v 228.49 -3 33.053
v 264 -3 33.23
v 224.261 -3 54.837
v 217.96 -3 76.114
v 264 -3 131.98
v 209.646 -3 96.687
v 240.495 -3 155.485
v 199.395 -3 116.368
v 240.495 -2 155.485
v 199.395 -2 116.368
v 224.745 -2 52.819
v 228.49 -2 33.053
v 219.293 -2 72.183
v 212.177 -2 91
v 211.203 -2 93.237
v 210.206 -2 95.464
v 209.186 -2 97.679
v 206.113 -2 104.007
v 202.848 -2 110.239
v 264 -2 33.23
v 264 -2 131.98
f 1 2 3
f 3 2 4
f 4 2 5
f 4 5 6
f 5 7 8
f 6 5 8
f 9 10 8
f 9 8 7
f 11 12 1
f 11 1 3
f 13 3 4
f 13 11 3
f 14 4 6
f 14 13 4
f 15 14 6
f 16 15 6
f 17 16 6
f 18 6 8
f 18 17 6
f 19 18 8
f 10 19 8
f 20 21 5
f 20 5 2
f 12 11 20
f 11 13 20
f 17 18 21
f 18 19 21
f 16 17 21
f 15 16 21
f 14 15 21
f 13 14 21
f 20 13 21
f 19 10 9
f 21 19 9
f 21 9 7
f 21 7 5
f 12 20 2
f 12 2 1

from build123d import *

# Parameters (mm, degrees)
BASEPLATE_PROFILE_DEPTH               = 2
SKETCH2_R                             = 1
M3_PINS_DEPTH                         = 5
M3_PINS_TAPER                         = 7
CIRPATTERN1_COUNT                     = 32
SKETCH4_R                             = 1
PILLAR_PINS_DEPTH                     = 5
PILLAR_PINS_DRAFT                     = 6
PILLAR_PINS_PROFILE_2_DEPTH           = 5
PILLAR_PINS_PROFILE_2_DRAFT           = 6
CIRPATTERN2_COPY_1_SKETCH_R           = 1
CIRPATTERN2_COPY_1_DEPTH              = 5
CIRPATTERN2_COPY_1_DRAFT              = 6
CIRPATTERN2_COPY_2_SKETCH_R           = 1
CIRPATTERN2_COPY_2_DEPTH              = 5
CIRPATTERN2_COPY_2_DRAFT              = 6
CIRPATTERN2_COPY_3_SKETCH_R           = 1
CIRPATTERN2_COPY_3_DEPTH              = 5
CIRPATTERN2_COPY_3_DRAFT              = 6
CIRPATTERN2_COPY_4_SKETCH_R           = 1
CIRPATTERN2_COPY_4_DEPTH              = 5
CIRPATTERN2_COPY_4_DRAFT              = 6
CIRPATTERN2_COPY_5_SKETCH_R           = 1
CIRPATTERN2_COPY_5_DEPTH              = 5
CIRPATTERN2_COPY_5_DRAFT              = 6
CIRPATTERN2_COPY_6_SKETCH_R           = 1
CIRPATTERN2_COPY_6_DEPTH              = 5
CIRPATTERN2_COPY_6_DRAFT              = 6
CIRPATTERN2_COPY_7_SKETCH_R           = 1
CIRPATTERN2_COPY_7_DEPTH              = 5
CIRPATTERN2_COPY_7_DRAFT              = 6
CIRPATTERN2_COPY_8_SKETCH_R           = 1
CIRPATTERN2_COPY_8_DEPTH              = 5
CIRPATTERN2_COPY_8_DRAFT              = 6
CIRPATTERN2_COPY_9_SKETCH_R           = 1
CIRPATTERN2_COPY_9_DEPTH              = 5
CIRPATTERN2_COPY_9_DRAFT              = 6
CIRPATTERN2_COPY_10_SKETCH_R          = 1
CIRPATTERN2_COPY_10_DEPTH             = 5
CIRPATTERN2_COPY_10_DRAFT             = 6
CIRPATTERN2_COPY_11_SKETCH_R          = 1
CIRPATTERN2_COPY_11_DEPTH             = 5
CIRPATTERN2_COPY_11_DRAFT             = 6
CIRPATTERN2_COPY_12_SKETCH_R          = 1
CIRPATTERN2_COPY_12_DEPTH             = 5
CIRPATTERN2_COPY_12_DRAFT             = 6
CIRPATTERN2_COPY_13_SKETCH_R          = 1
CIRPATTERN2_COPY_13_DEPTH             = 5
CIRPATTERN2_COPY_13_DRAFT             = 6
CIRPATTERN2_COPY_14_SKETCH_R          = 1
CIRPATTERN2_COPY_14_DEPTH             = 5
CIRPATTERN2_COPY_14_DRAFT             = 6
CIRPATTERN2_COPY_15_SKETCH_R          = 1
CIRPATTERN2_COPY_15_DEPTH             = 5
CIRPATTERN2_COPY_15_DRAFT             = 6
SKETCH5_R                             = 3
M8_HOLE_1_DEPTH                       = 5
M8_HOLE_1_TAPER                       = 12
M8_1_PATTERN_COUNT                    = 4
SKETCH6_R                             = 3
EXTRUDE_M8_2_DEPTH                    = 5
EXTRUDE_M8_2_TAPER                    = 12
M8_2_PATTERN_COUNT                    = 4
PATTERN_CIRCULAR_M8_3_COUNT           = 2
PATTERN_CIRCULAR_M8_3_ANGLE           = 36.9
PATTERN_CIRCULAR_M8_3_COPY_1_SKETCH_R = 3
PATTERN_CIRCULAR_M8_3_COPY_1_DEPTH    = 5
PATTERN_CIRCULAR_M8_3_COPY_1_TAPER    = 12
PATTERN_CIRCULAR_M8_3_COPY_2_SKETCH_R = 3
PATTERN_CIRCULAR_M8_3_COPY_2_DEPTH    = 5
PATTERN_CIRCULAR_M8_3_COPY_2_TAPER    = 12
PATTERN_CIRCULAR_M8_3_COPY_3_SKETCH_R = 3
PATTERN_CIRCULAR_M8_3_COPY_3_DEPTH    = 5
PATTERN_CIRCULAR_M8_3_COPY_3_TAPER    = 12
CUT_CENTER_DEPTH                      = 374.385859402
CIRPATTERN7_COUNT                     = 6
SKETCH16_W                            = 706.015434107
SKETCH16_H                            = 962.246603821
SKETCH16_W_2                          = 199
SKETCH16_H_2                          = 199
CUT_EXTRUDE4_DEPTH                    = 374.417996354
CUT_EXTRUDE5_DEPTH                    = 374.385859402
BOSS_EXTRUDE3_DEPTH                   = 2
BOSS_EXTRUDE4_DEPTH                   = 1
SKETCH21_W                            = 326.425161963
SKETCH21_H                            = 364.538398874
CUT_EXTRUDE6_DEPTH                    = 374.417996354


with BuildPart() as part:
    # Sketch1 → baseplate profile (new body)
    with BuildSketch(Plane(origin=(0, 0, 0), x_dir=(1, 0, 0), z_dir=(0, 1, 0))):
        Polygon((264, 0), (264, 131.98), (131.979594929, 264), (0, 264), (-131.98, 264), (-264, 131.979594929), (-264, 0), (-264, -131.98), (-131.979594929, -264), (0, -264), (131.98, -264), (264, -131.979594929), align=None)
    extrude(amount=-BASEPLATE_PROFILE_DEPTH)

    # Sketch2 → M3 pins (add)
    with BuildSketch(Plane(origin=(0, 0, 0), x_dir=(1, 0, 0), z_dir=(0, 1, 0))):
        with Locations((0, 248)):
            Circle(SKETCH2_R)
    m3_pins = extrude(amount=M3_PINS_DEPTH, taper=M3_PINS_TAPER)

    # CirPattern1: M3 pins ×32 about axis
    cirpattern1_axis = Axis((0, 0, 0), (0, 1, 0))
    for i in range(1, CIRPATTERN1_COUNT):
        add(m3_pins.rotate(cirpattern1_axis, i * 360 / CIRPATTERN1_COUNT))


with BuildPart() as pillar_pins_tool:
    # Sketch4 → pillar pins (with draft: the straight prism first)
    with BuildSketch(Plane(origin=(0, 0, 0), x_dir=(1, 0, 0), z_dir=(0, 1, 0))):
        with Locations((9, 201)):
            Circle(SKETCH4_R)
    extrude(amount=PILLAR_PINS_DEPTH)
    # pillar pins: the draft: its side faces are tilted about the plane it starts from
    pillar_pins_sides = [pillar_pins_tool.faces().sort_by_distance(p)[0] for p in [
        (8, 2.5, -201),
    ]]
    draft(pillar_pins_sides, Plane(origin=(0, 0, 0), x_dir=(1, 0, 0), z_dir=(0, 1, 0)), PILLAR_PINS_DRAFT)


with BuildPart() as part_1:
    add(part.part)

    # pillar pins: add pillar_pins_tool
    add(pillar_pins_tool.part)


with BuildPart() as pillar_pins_profile_2_tool:
    # Sketch4 → pillar pins profile 2 (with draft: the straight prism first)
    with BuildSketch(Plane(origin=(0, 0, 0), x_dir=(1, 0, 0), z_dir=(0, 1, 0))):
        with Locations((-9, 201)):
            Circle(SKETCH4_R)
    extrude(amount=PILLAR_PINS_PROFILE_2_DEPTH)
    # pillar pins profile 2: the draft: its side faces are tilted about the plane it starts from
    pillar_pins_profile_2_sides = [pillar_pins_profile_2_tool.faces().sort_by_distance(p)[0] for p in [
        (-10, 2.5, -201),
    ]]
    draft(pillar_pins_profile_2_sides, Plane(origin=(0, 0, 0), x_dir=(1, 0, 0), z_dir=(0, 1, 0)), PILLAR_PINS_PROFILE_2_DRAFT)


with BuildPart() as part_2:
    add(part_1.part)

    # pillar pins profile 2: add pillar_pins_profile_2_tool
    add(pillar_pins_profile_2_tool.part)


with BuildPart() as cirpattern2_copy_1_tool:
    # CirPattern2 copy 1 sketch → CirPattern2 copy 1 (with draft: the straight prism first)
    with BuildSketch(Plane(origin=(0, 0, 0), x_dir=(0.5000000000000001, 0, -0.8660254037844386), z_dir=(0, 1, 0))):
        with Locations((9, 201)):
            Circle(CIRPATTERN2_COPY_1_SKETCH_R)
    extrude(amount=CIRPATTERN2_COPY_1_DEPTH)
    # CirPattern2 copy 1: the draft: its side faces are tilted about the plane it starts from
    cirpattern2_copy_1_sides = [cirpattern2_copy_1_tool.faces().sort_by_distance(p)[0] for p in [
        (-170.071106161, 2.5, -107.42820323),
    ]]
    draft(cirpattern2_copy_1_sides, Plane(origin=(0, 0, 0), x_dir=(0.5000000000000001, 0, -0.8660254037844386), z_dir=(0, 1, 0)), CIRPATTERN2_COPY_1_DRAFT)


with BuildPart() as part_3:
    add(part_2.part)

    # CirPattern2 copy 1: add cirpattern2_copy_1_tool
    add(cirpattern2_copy_1_tool.part)


with BuildPart() as cirpattern2_copy_2_tool:
    # CirPattern2 copy 2 sketch → CirPattern2 copy 2 (with draft: the straight prism first)
    with BuildSketch(Plane(origin=(0, 0, 0), x_dir=(-0.4999999999999998, 0, -0.8660254037844387), z_dir=(0, 1, 0))):
        with Locations((9, 201)):
            Circle(CIRPATTERN2_COPY_2_SKETCH_R)
    extrude(amount=CIRPATTERN2_COPY_2_DEPTH)
    # CirPattern2 copy 2: the draft: its side faces are tilted about the plane it starts from
    cirpattern2_copy_2_sides = [cirpattern2_copy_2_tool.faces().sort_by_distance(p)[0] for p in [
        (-178.071106161, 2.5, 93.57179677),
    ]]
    draft(cirpattern2_copy_2_sides, Plane(origin=(0, 0, 0), x_dir=(-0.4999999999999998, 0, -0.8660254037844387), z_dir=(0, 1, 0)), CIRPATTERN2_COPY_2_DRAFT)


with BuildPart() as part_4:
    add(part_3.part)

    # CirPattern2 copy 2: add cirpattern2_copy_2_tool
    add(cirpattern2_copy_2_tool.part)


with BuildPart() as cirpattern2_copy_3_tool:
    # CirPattern2 copy 3 sketch → CirPattern2 copy 3 (with draft: the straight prism first)
    with BuildSketch(Plane(origin=(0, 0, 0), x_dir=(-1, 0, 0), z_dir=(0, 1, 0))):
        with Locations((9, 201)):
            Circle(CIRPATTERN2_COPY_3_SKETCH_R)
    extrude(amount=CIRPATTERN2_COPY_3_DEPTH)
    # CirPattern2 copy 3: the draft: its side faces are tilted about the plane it starts from
    cirpattern2_copy_3_sides = [cirpattern2_copy_3_tool.faces().sort_by_distance(p)[0] for p in [
        (-8, 2.5, 201),
    ]]
    draft(cirpattern2_copy_3_sides, Plane(origin=(0, 0, 0), x_dir=(-1, 0, 0), z_dir=(0, 1, 0)), CIRPATTERN2_COPY_3_DRAFT)


with BuildPart() as part_5:
    add(part_4.part)

    # CirPattern2 copy 3: add cirpattern2_copy_3_tool
    add(cirpattern2_copy_3_tool.part)


with BuildPart() as cirpattern2_copy_4_tool:
    # CirPattern2 copy 4 sketch → CirPattern2 copy 4 (with draft: the straight prism first)
    with BuildSketch(Plane(origin=(0, 0, 0), x_dir=(-0.5000000000000004, 0, 0.8660254037844384), z_dir=(0, 1, 0))):
        with Locations((9, 201)):
            Circle(CIRPATTERN2_COPY_4_SKETCH_R)
    extrude(amount=CIRPATTERN2_COPY_4_DEPTH)
    # CirPattern2 copy 4: the draft: its side faces are tilted about the plane it starts from
    cirpattern2_copy_4_sides = [cirpattern2_copy_4_tool.faces().sort_by_distance(p)[0] for p in [
        (170.071106161, 2.5, 107.42820323),
    ]]
    draft(cirpattern2_copy_4_sides, Plane(origin=(0, 0, 0), x_dir=(-0.5000000000000004, 0, 0.8660254037844384), z_dir=(0, 1, 0)), CIRPATTERN2_COPY_4_DRAFT)


with BuildPart() as part_6:
    add(part_5.part)

    # CirPattern2 copy 4: add cirpattern2_copy_4_tool
    add(cirpattern2_copy_4_tool.part)


with BuildPart() as cirpattern2_copy_5_tool:
    # CirPattern2 copy 5 sketch → CirPattern2 copy 5 (with draft: the straight prism first)
    with BuildSketch(Plane(origin=(0, 0, 0), x_dir=(0.5000000000000001, 0, 0.8660254037844386), z_dir=(0, 1, 0))):
        with Locations((9, 201)):
            Circle(CIRPATTERN2_COPY_5_SKETCH_R)
    extrude(amount=CIRPATTERN2_COPY_5_DEPTH)
    # CirPattern2 copy 5: the draft: its side faces are tilted about the plane it starts from
    cirpattern2_copy_5_sides = [cirpattern2_copy_5_tool.faces().sort_by_distance(p)[0] for p in [
        (178.071106161, 2.5, -93.57179677),
    ]]
    draft(cirpattern2_copy_5_sides, Plane(origin=(0, 0, 0), x_dir=(0.5000000000000001, 0, 0.8660254037844386), z_dir=(0, 1, 0)), CIRPATTERN2_COPY_5_DRAFT)


with BuildPart() as part_7:
    add(part_6.part)

    # CirPattern2 copy 5: add cirpattern2_copy_5_tool
    add(cirpattern2_copy_5_tool.part)


with BuildPart() as cirpattern2_copy_6_tool:
    # CirPattern2 copy 6 sketch → CirPattern2 copy 6 (with draft: the straight prism first)
    with BuildSketch(Plane(origin=(0, 0, 0), x_dir=(0.5000000000000001, 0, -0.8660254037844386), z_dir=(0, 1, 0))):
        with Locations((-9, 201)):
            Circle(CIRPATTERN2_COPY_6_SKETCH_R)
    extrude(amount=CIRPATTERN2_COPY_6_DEPTH)
    # CirPattern2 copy 6: the draft: its side faces are tilted about the plane it starts from
    cirpattern2_copy_6_sides = [cirpattern2_copy_6_tool.faces().sort_by_distance(p)[0] for p in [
        (-179.071106161, 2.5, -91.839745962),
    ]]
    draft(cirpattern2_copy_6_sides, Plane(origin=(0, 0, 0), x_dir=(0.5000000000000001, 0, -0.8660254037844386), z_dir=(0, 1, 0)), CIRPATTERN2_COPY_6_DRAFT)


with BuildPart() as part_8:
    add(part_7.part)

    # CirPattern2 copy 6: add cirpattern2_copy_6_tool
    add(cirpattern2_copy_6_tool.part)


with BuildPart() as cirpattern2_copy_7_tool:
    # CirPattern2 copy 7 sketch → CirPattern2 copy 7 (with draft: the straight prism first)
    with BuildSketch(Plane(origin=(0, 0, 0), x_dir=(-0.4999999999999998, 0, -0.8660254037844387), z_dir=(0, 1, 0))):
        with Locations((-9, 201)):
            Circle(CIRPATTERN2_COPY_7_SKETCH_R)
    extrude(amount=CIRPATTERN2_COPY_7_DEPTH)
    # CirPattern2 copy 7: the draft: its side faces are tilted about the plane it starts from
    cirpattern2_copy_7_sides = [cirpattern2_copy_7_tool.faces().sort_by_distance(p)[0] for p in [
        (-169.071106161, 2.5, 109.160254038),
    ]]
    draft(cirpattern2_copy_7_sides, Plane(origin=(0, 0, 0), x_dir=(-0.4999999999999998, 0, -0.8660254037844387), z_dir=(0, 1, 0)), CIRPATTERN2_COPY_7_DRAFT)


with BuildPart() as part_9:
    add(part_8.part)

    # CirPattern2 copy 7: add cirpattern2_copy_7_tool
    add(cirpattern2_copy_7_tool.part)


with BuildPart() as cirpattern2_copy_8_tool:
    # CirPattern2 copy 8 sketch → CirPattern2 copy 8 (with draft: the straight prism first)
    with BuildSketch(Plane(origin=(0, 0, 0), x_dir=(-1, 0, 0), z_dir=(0, 1, 0))):
        with Locations((-9, 201)):
            Circle(CIRPATTERN2_COPY_8_SKETCH_R)
    extrude(amount=CIRPATTERN2_COPY_8_DEPTH)
    # CirPattern2 copy 8: the draft: its side faces are tilted about the plane it starts from
    cirpattern2_copy_8_sides = [cirpattern2_copy_8_tool.faces().sort_by_distance(p)[0] for p in [
        (10, 2.5, 201),
    ]]
    draft(cirpattern2_copy_8_sides, Plane(origin=(0, 0, 0), x_dir=(-1, 0, 0), z_dir=(0, 1, 0)), CIRPATTERN2_COPY_8_DRAFT)


with BuildPart() as part_10:
    add(part_9.part)

    # CirPattern2 copy 8: add cirpattern2_copy_8_tool
    add(cirpattern2_copy_8_tool.part)


with BuildPart() as cirpattern2_copy_9_tool:
    # CirPattern2 copy 9 sketch → CirPattern2 copy 9 (with draft: the straight prism first)
    with BuildSketch(Plane(origin=(0, 0, 0), x_dir=(-0.5000000000000004, 0, 0.8660254037844384), z_dir=(0, 1, 0))):
        with Locations((-9, 201)):
            Circle(CIRPATTERN2_COPY_9_SKETCH_R)
    extrude(amount=CIRPATTERN2_COPY_9_DEPTH)
    # CirPattern2 copy 9: the draft: its side faces are tilted about the plane it starts from
    cirpattern2_copy_9_sides = [cirpattern2_copy_9_tool.faces().sort_by_distance(p)[0] for p in [
        (179.071106161, 2.5, 91.839745962),
    ]]
    draft(cirpattern2_copy_9_sides, Plane(origin=(0, 0, 0), x_dir=(-0.5000000000000004, 0, 0.8660254037844384), z_dir=(0, 1, 0)), CIRPATTERN2_COPY_9_DRAFT)


with BuildPart() as part_11:
    add(part_10.part)

    # CirPattern2 copy 9: add cirpattern2_copy_9_tool
    add(cirpattern2_copy_9_tool.part)


with BuildPart() as cirpattern2_copy_10_tool:
    # CirPattern2 copy 10 sketch → CirPattern2 copy 10 (with draft: the straight prism first)
    with BuildSketch(Plane(origin=(0, 0, 0), x_dir=(0.5000000000000001, 0, 0.8660254037844386), z_dir=(0, 1, 0))):
        with Locations((-9, 201)):
            Circle(CIRPATTERN2_COPY_10_SKETCH_R)
    extrude(amount=CIRPATTERN2_COPY_10_DEPTH)
    # CirPattern2 copy 10: the draft: its side faces are tilted about the plane it starts from
    cirpattern2_copy_10_sides = [cirpattern2_copy_10_tool.faces().sort_by_distance(p)[0] for p in [
        (169.071106161, 2.5, -109.160254038),
    ]]
    draft(cirpattern2_copy_10_sides, Plane(origin=(0, 0, 0), x_dir=(0.5000000000000001, 0, 0.8660254037844386), z_dir=(0, 1, 0)), CIRPATTERN2_COPY_10_DRAFT)


with BuildPart() as part_12:
    add(part_11.part)

    # CirPattern2 copy 10: add cirpattern2_copy_10_tool
    add(cirpattern2_copy_10_tool.part)


with BuildPart() as cirpattern2_copy_11_tool:
    # CirPattern2 copy 11 sketch → CirPattern2 copy 11 (with draft: the straight prism first)
    with BuildSketch(Plane(origin=(0, 0, 0), x_dir=(0.5000000000000001, 0, -0.8660254037844386), z_dir=(0, 1, 0))):
        with Locations((-9, 201)):
            Circle(CIRPATTERN2_COPY_11_SKETCH_R)
    extrude(amount=CIRPATTERN2_COPY_11_DEPTH)
    # CirPattern2 copy 11: the draft: its side faces are tilted about the plane it starts from
    cirpattern2_copy_11_sides = [cirpattern2_copy_11_tool.faces().sort_by_distance(p)[0] for p in [
        (-179.071106161, 2.5, -91.839745962),
    ]]
    draft(cirpattern2_copy_11_sides, Plane(origin=(0, 0, 0), x_dir=(0.5000000000000001, 0, -0.8660254037844386), z_dir=(0, 1, 0)), CIRPATTERN2_COPY_11_DRAFT)


with BuildPart() as part_13:
    add(part_12.part)

    # CirPattern2 copy 11: add cirpattern2_copy_11_tool
    add(cirpattern2_copy_11_tool.part)


with BuildPart() as cirpattern2_copy_12_tool:
    # CirPattern2 copy 12 sketch → CirPattern2 copy 12 (with draft: the straight prism first)
    with BuildSketch(Plane(origin=(0, 0, 0), x_dir=(-0.4999999999999998, 0, -0.8660254037844387), z_dir=(0, 1, 0))):
        with Locations((-9, 201)):
            Circle(CIRPATTERN2_COPY_12_SKETCH_R)
    extrude(amount=CIRPATTERN2_COPY_12_DEPTH)
    # CirPattern2 copy 12: the draft: its side faces are tilted about the plane it starts from
    cirpattern2_copy_12_sides = [cirpattern2_copy_12_tool.faces().sort_by_distance(p)[0] for p in [
        (-169.071106161, 2.5, 109.160254038),
    ]]
    draft(cirpattern2_copy_12_sides, Plane(origin=(0, 0, 0), x_dir=(-0.4999999999999998, 0, -0.8660254037844387), z_dir=(0, 1, 0)), CIRPATTERN2_COPY_12_DRAFT)


with BuildPart() as part_14:
    add(part_13.part)

    # CirPattern2 copy 12: add cirpattern2_copy_12_tool
    add(cirpattern2_copy_12_tool.part)


with BuildPart() as cirpattern2_copy_13_tool:
    # CirPattern2 copy 13 sketch → CirPattern2 copy 13 (with draft: the straight prism first)
    with BuildSketch(Plane(origin=(0, 0, 0), x_dir=(-1, 0, 0), z_dir=(0, 1, 0))):
        with Locations((-9, 201)):
            Circle(CIRPATTERN2_COPY_13_SKETCH_R)
    extrude(amount=CIRPATTERN2_COPY_13_DEPTH)
    # CirPattern2 copy 13: the draft: its side faces are tilted about the plane it starts from
    cirpattern2_copy_13_sides = [cirpattern2_copy_13_tool.faces().sort_by_distance(p)[0] for p in [
        (10, 2.5, 201),
    ]]
    draft(cirpattern2_copy_13_sides, Plane(origin=(0, 0, 0), x_dir=(-1, 0, 0), z_dir=(0, 1, 0)), CIRPATTERN2_COPY_13_DRAFT)


with BuildPart() as part_15:
    add(part_14.part)

    # CirPattern2 copy 13: add cirpattern2_copy_13_tool
    add(cirpattern2_copy_13_tool.part)


with BuildPart() as cirpattern2_copy_14_tool:
    # CirPattern2 copy 14 sketch → CirPattern2 copy 14 (with draft: the straight prism first)
    with BuildSketch(Plane(origin=(0, 0, 0), x_dir=(-0.5000000000000004, 0, 0.8660254037844384), z_dir=(0, 1, 0))):
        with Locations((-9, 201)):
            Circle(CIRPATTERN2_COPY_14_SKETCH_R)
    extrude(amount=CIRPATTERN2_COPY_14_DEPTH)
    # CirPattern2 copy 14: the draft: its side faces are tilted about the plane it starts from
    cirpattern2_copy_14_sides = [cirpattern2_copy_14_tool.faces().sort_by_distance(p)[0] for p in [
        (179.071106161, 2.5, 91.839745962),
    ]]
    draft(cirpattern2_copy_14_sides, Plane(origin=(0, 0, 0), x_dir=(-0.5000000000000004, 0, 0.8660254037844384), z_dir=(0, 1, 0)), CIRPATTERN2_COPY_14_DRAFT)


with BuildPart() as part_16:
    add(part_15.part)

    # CirPattern2 copy 14: add cirpattern2_copy_14_tool
    add(cirpattern2_copy_14_tool.part)


with BuildPart() as cirpattern2_copy_15_tool:
    # CirPattern2 copy 15 sketch → CirPattern2 copy 15 (with draft: the straight prism first)
    with BuildSketch(Plane(origin=(0, 0, 0), x_dir=(0.5000000000000001, 0, 0.8660254037844386), z_dir=(0, 1, 0))):
        with Locations((-9, 201)):
            Circle(CIRPATTERN2_COPY_15_SKETCH_R)
    extrude(amount=CIRPATTERN2_COPY_15_DEPTH)
    # CirPattern2 copy 15: the draft: its side faces are tilted about the plane it starts from
    cirpattern2_copy_15_sides = [cirpattern2_copy_15_tool.faces().sort_by_distance(p)[0] for p in [
        (169.071106161, 2.5, -109.160254038),
    ]]
    draft(cirpattern2_copy_15_sides, Plane(origin=(0, 0, 0), x_dir=(0.5000000000000001, 0, 0.8660254037844386), z_dir=(0, 1, 0)), CIRPATTERN2_COPY_15_DRAFT)


with BuildPart() as part_17:
    add(part_16.part)

    # CirPattern2 copy 15: add cirpattern2_copy_15_tool
    add(cirpattern2_copy_15_tool.part)

    # Sketch5 → M8 hole -1 (add)
    with BuildSketch(Plane(origin=(0, 0, 0), x_dir=(1, 0, 0), z_dir=(0, 1, 0))):
        with Locations((-193.040151264, 193.040151264)):
            Circle(SKETCH5_R)
    m8_hole_1 = extrude(amount=M8_HOLE_1_DEPTH, taper=M8_HOLE_1_TAPER)

    # M8 -1 pattern: M8 hole -1 ×4 about axis
    m8_1_pattern_axis = Axis((0, 0, 0), (0, 1, 0))
    for i in range(1, M8_1_PATTERN_COUNT):
        add(m8_hole_1.rotate(m8_1_pattern_axis, i * 360 / M8_1_PATTERN_COUNT))

    # Sketch6 → M8 -2 (add)
    with BuildSketch(Plane(origin=(0, 0, 0), x_dir=(1, 0, 0), z_dir=(0, 1, 0))):
        with Locations((-125, -250)):
            Circle(SKETCH6_R)
    extrude_m8_2 = extrude(amount=EXTRUDE_M8_2_DEPTH, taper=EXTRUDE_M8_2_TAPER)

    # M8 -2 pattern: M8 -2 ×4 about axis
    m8_2_pattern_axis = Axis((0, 0, 0), (0, 1, 0))
    for i in range(1, M8_2_PATTERN_COUNT):
        add(extrude_m8_2.rotate(m8_2_pattern_axis, i * 360 / M8_2_PATTERN_COUNT))

    # M8 -3: M8 -2 ×2 about axis
    pattern_circular_m8_3_axis = Axis((0, 0, 0), (0, -1, 0))
    for i in range(1, PATTERN_CIRCULAR_M8_3_COUNT):
        add(extrude_m8_2.rotate(pattern_circular_m8_3_axis, i * PATTERN_CIRCULAR_M8_3_ANGLE / (PATTERN_CIRCULAR_M8_3_COUNT - 1)))

    # M8 -3 copy 1 sketch → M8 -3 copy 1 (add)
    with BuildSketch(Plane(origin=(0, 0, 0), x_dir=(0.6004202253258852, 0, -0.7996846584870897), z_dir=(0, 1, 0))):
        with Locations((-125, -250)):
            Circle(PATTERN_CIRCULAR_M8_3_COPY_1_SKETCH_R)
    extrude(amount=PATTERN_CIRCULAR_M8_3_COPY_1_DEPTH, taper=PATTERN_CIRCULAR_M8_3_COPY_1_TAPER)

    # M8 -3 copy 2 sketch → M8 -3 copy 2 (add)
    with BuildSketch(Plane(origin=(0, 0, 0), x_dir=(-0.7996846584870896, 0, -0.6004202253258853), z_dir=(0, 1, 0))):
        with Locations((-125, -250)):
            Circle(PATTERN_CIRCULAR_M8_3_COPY_2_SKETCH_R)
    extrude(amount=PATTERN_CIRCULAR_M8_3_COPY_2_DEPTH, taper=PATTERN_CIRCULAR_M8_3_COPY_2_TAPER)

    # M8 -3 copy 3 sketch → M8 -3 copy 3 (add)
    with BuildSketch(Plane(origin=(0, 0, 0), x_dir=(-0.6004202253258853, 0, 0.7996846584870896), z_dir=(0, 1, 0))):
        with Locations((-125, -250)):
            Circle(PATTERN_CIRCULAR_M8_3_COPY_3_SKETCH_R)
    extrude(amount=PATTERN_CIRCULAR_M8_3_COPY_3_DEPTH, taper=PATTERN_CIRCULAR_M8_3_COPY_3_TAPER)

    # Sketch8 → cut center (cut, through all)
    with BuildSketch(Plane(origin=(0, 0, 0), x_dir=(1, 0, 0), z_dir=(0, 1, 0))):
        with BuildLine():
            Line((115.433963806, -199.937490231), (0, 0))
            Line((0, 0), (0, -180))
            Line((0, -180), (20, -180))
            Line((20, -180), (20, -230))
            ThreePointArc((20, -230), (69.365180469, -220.200980331), (115.433963806, -199.937490231))
        make_face()
        with BuildLine():
            Line((0, -180), (0, 0))
            Line((0, 0), (-115.433963806, -199.937490231))
            ThreePointArc((-115.433963806, -199.937490231), (-69.365180469, -220.200980331), (-20, -230))
            Line((-20, -230), (-20, -180))
            Line((-20, -180), (0, -180))
        make_face()
    cut_center = extrude(amount=-CUT_CENTER_DEPTH, mode=Mode.SUBTRACT)

    # CirPattern7: cut center ×6 about axis
    cirpattern7_axis = Axis((0, 0, 0), (0, 1, 0))
    for i in range(1, CIRPATTERN7_COUNT):
        add(cut_center.rotate(cirpattern7_axis, i * 360 / CIRPATTERN7_COUNT), mode=Mode.SUBTRACT)

    # Sketch16 → Cut-Extrude4 (cut, through all)
    with BuildSketch(Plane.XZ.offset(2)):
        with Locations((12.105337572, -26.075320592)):
            Rectangle(SKETCH16_W, SKETCH16_H)
        with Locations((190.5, 190.5)):
            Rectangle(SKETCH16_W_2, SKETCH16_H_2, mode=Mode.SUBTRACT)
    extrude(amount=-CUT_EXTRUDE4_DEPTH, mode=Mode.SUBTRACT)

    # Sketch17 → Cut-Extrude5 (cut, through all)
    with BuildSketch(Plane(origin=(0, 0, 0), x_dir=(1, 0, 0), z_dir=(0, 1, 0))):
        Polygon((81, -244), (96, -252.660254038), (96, -235.339745962), align=None)
    extrude(amount=-CUT_EXTRUDE5_DEPTH, mode=Mode.SUBTRACT)

    # Sketch19 → Boss-Extrude3 (add)
    with BuildSketch(Plane(origin=(0, -2, 0), x_dir=(-1, 0, 0), z_dir=(0, -1, 0))):
        Polygon((-235.339745962, -86), (-252.660254038, -86), (-244, -101), align=None)
    extrude(amount=-BOSS_EXTRUDE3_DEPTH)

    # Sketch20 → Boss-Extrude4 (add)
    with BuildSketch(Plane.XZ.offset(2)):
        with BuildLine():
            Line((240.494949993, 155.484717056), (264, 131.979594929))
            Line((264, 131.979594929), (264, 33.229825763))
            Line((264, 33.229825763), (228.489590239, 33.05309596))
            ThreePointArc((228.489590239, 33.05309596), (217.960347438, 76.113644932), (199.3952958, 116.368019717))
            Line((199.3952958, 116.368019717), (240.494949993, 155.484717056))
        make_face()
    extrude(amount=BOSS_EXTRUDE4_DEPTH)

    # Sketch21 → Cut-Extrude6 (cut, through all)
    with BuildSketch(Plane.XZ.offset(2)):
        with Locations((202.532221133, 140.310862517)):
            Rectangle(SKETCH21_W, SKETCH21_H)
    extrude(amount=-CUT_EXTRUDE6_DEPTH, mode=Mode.SUBTRACT)


solid = part_17.part
